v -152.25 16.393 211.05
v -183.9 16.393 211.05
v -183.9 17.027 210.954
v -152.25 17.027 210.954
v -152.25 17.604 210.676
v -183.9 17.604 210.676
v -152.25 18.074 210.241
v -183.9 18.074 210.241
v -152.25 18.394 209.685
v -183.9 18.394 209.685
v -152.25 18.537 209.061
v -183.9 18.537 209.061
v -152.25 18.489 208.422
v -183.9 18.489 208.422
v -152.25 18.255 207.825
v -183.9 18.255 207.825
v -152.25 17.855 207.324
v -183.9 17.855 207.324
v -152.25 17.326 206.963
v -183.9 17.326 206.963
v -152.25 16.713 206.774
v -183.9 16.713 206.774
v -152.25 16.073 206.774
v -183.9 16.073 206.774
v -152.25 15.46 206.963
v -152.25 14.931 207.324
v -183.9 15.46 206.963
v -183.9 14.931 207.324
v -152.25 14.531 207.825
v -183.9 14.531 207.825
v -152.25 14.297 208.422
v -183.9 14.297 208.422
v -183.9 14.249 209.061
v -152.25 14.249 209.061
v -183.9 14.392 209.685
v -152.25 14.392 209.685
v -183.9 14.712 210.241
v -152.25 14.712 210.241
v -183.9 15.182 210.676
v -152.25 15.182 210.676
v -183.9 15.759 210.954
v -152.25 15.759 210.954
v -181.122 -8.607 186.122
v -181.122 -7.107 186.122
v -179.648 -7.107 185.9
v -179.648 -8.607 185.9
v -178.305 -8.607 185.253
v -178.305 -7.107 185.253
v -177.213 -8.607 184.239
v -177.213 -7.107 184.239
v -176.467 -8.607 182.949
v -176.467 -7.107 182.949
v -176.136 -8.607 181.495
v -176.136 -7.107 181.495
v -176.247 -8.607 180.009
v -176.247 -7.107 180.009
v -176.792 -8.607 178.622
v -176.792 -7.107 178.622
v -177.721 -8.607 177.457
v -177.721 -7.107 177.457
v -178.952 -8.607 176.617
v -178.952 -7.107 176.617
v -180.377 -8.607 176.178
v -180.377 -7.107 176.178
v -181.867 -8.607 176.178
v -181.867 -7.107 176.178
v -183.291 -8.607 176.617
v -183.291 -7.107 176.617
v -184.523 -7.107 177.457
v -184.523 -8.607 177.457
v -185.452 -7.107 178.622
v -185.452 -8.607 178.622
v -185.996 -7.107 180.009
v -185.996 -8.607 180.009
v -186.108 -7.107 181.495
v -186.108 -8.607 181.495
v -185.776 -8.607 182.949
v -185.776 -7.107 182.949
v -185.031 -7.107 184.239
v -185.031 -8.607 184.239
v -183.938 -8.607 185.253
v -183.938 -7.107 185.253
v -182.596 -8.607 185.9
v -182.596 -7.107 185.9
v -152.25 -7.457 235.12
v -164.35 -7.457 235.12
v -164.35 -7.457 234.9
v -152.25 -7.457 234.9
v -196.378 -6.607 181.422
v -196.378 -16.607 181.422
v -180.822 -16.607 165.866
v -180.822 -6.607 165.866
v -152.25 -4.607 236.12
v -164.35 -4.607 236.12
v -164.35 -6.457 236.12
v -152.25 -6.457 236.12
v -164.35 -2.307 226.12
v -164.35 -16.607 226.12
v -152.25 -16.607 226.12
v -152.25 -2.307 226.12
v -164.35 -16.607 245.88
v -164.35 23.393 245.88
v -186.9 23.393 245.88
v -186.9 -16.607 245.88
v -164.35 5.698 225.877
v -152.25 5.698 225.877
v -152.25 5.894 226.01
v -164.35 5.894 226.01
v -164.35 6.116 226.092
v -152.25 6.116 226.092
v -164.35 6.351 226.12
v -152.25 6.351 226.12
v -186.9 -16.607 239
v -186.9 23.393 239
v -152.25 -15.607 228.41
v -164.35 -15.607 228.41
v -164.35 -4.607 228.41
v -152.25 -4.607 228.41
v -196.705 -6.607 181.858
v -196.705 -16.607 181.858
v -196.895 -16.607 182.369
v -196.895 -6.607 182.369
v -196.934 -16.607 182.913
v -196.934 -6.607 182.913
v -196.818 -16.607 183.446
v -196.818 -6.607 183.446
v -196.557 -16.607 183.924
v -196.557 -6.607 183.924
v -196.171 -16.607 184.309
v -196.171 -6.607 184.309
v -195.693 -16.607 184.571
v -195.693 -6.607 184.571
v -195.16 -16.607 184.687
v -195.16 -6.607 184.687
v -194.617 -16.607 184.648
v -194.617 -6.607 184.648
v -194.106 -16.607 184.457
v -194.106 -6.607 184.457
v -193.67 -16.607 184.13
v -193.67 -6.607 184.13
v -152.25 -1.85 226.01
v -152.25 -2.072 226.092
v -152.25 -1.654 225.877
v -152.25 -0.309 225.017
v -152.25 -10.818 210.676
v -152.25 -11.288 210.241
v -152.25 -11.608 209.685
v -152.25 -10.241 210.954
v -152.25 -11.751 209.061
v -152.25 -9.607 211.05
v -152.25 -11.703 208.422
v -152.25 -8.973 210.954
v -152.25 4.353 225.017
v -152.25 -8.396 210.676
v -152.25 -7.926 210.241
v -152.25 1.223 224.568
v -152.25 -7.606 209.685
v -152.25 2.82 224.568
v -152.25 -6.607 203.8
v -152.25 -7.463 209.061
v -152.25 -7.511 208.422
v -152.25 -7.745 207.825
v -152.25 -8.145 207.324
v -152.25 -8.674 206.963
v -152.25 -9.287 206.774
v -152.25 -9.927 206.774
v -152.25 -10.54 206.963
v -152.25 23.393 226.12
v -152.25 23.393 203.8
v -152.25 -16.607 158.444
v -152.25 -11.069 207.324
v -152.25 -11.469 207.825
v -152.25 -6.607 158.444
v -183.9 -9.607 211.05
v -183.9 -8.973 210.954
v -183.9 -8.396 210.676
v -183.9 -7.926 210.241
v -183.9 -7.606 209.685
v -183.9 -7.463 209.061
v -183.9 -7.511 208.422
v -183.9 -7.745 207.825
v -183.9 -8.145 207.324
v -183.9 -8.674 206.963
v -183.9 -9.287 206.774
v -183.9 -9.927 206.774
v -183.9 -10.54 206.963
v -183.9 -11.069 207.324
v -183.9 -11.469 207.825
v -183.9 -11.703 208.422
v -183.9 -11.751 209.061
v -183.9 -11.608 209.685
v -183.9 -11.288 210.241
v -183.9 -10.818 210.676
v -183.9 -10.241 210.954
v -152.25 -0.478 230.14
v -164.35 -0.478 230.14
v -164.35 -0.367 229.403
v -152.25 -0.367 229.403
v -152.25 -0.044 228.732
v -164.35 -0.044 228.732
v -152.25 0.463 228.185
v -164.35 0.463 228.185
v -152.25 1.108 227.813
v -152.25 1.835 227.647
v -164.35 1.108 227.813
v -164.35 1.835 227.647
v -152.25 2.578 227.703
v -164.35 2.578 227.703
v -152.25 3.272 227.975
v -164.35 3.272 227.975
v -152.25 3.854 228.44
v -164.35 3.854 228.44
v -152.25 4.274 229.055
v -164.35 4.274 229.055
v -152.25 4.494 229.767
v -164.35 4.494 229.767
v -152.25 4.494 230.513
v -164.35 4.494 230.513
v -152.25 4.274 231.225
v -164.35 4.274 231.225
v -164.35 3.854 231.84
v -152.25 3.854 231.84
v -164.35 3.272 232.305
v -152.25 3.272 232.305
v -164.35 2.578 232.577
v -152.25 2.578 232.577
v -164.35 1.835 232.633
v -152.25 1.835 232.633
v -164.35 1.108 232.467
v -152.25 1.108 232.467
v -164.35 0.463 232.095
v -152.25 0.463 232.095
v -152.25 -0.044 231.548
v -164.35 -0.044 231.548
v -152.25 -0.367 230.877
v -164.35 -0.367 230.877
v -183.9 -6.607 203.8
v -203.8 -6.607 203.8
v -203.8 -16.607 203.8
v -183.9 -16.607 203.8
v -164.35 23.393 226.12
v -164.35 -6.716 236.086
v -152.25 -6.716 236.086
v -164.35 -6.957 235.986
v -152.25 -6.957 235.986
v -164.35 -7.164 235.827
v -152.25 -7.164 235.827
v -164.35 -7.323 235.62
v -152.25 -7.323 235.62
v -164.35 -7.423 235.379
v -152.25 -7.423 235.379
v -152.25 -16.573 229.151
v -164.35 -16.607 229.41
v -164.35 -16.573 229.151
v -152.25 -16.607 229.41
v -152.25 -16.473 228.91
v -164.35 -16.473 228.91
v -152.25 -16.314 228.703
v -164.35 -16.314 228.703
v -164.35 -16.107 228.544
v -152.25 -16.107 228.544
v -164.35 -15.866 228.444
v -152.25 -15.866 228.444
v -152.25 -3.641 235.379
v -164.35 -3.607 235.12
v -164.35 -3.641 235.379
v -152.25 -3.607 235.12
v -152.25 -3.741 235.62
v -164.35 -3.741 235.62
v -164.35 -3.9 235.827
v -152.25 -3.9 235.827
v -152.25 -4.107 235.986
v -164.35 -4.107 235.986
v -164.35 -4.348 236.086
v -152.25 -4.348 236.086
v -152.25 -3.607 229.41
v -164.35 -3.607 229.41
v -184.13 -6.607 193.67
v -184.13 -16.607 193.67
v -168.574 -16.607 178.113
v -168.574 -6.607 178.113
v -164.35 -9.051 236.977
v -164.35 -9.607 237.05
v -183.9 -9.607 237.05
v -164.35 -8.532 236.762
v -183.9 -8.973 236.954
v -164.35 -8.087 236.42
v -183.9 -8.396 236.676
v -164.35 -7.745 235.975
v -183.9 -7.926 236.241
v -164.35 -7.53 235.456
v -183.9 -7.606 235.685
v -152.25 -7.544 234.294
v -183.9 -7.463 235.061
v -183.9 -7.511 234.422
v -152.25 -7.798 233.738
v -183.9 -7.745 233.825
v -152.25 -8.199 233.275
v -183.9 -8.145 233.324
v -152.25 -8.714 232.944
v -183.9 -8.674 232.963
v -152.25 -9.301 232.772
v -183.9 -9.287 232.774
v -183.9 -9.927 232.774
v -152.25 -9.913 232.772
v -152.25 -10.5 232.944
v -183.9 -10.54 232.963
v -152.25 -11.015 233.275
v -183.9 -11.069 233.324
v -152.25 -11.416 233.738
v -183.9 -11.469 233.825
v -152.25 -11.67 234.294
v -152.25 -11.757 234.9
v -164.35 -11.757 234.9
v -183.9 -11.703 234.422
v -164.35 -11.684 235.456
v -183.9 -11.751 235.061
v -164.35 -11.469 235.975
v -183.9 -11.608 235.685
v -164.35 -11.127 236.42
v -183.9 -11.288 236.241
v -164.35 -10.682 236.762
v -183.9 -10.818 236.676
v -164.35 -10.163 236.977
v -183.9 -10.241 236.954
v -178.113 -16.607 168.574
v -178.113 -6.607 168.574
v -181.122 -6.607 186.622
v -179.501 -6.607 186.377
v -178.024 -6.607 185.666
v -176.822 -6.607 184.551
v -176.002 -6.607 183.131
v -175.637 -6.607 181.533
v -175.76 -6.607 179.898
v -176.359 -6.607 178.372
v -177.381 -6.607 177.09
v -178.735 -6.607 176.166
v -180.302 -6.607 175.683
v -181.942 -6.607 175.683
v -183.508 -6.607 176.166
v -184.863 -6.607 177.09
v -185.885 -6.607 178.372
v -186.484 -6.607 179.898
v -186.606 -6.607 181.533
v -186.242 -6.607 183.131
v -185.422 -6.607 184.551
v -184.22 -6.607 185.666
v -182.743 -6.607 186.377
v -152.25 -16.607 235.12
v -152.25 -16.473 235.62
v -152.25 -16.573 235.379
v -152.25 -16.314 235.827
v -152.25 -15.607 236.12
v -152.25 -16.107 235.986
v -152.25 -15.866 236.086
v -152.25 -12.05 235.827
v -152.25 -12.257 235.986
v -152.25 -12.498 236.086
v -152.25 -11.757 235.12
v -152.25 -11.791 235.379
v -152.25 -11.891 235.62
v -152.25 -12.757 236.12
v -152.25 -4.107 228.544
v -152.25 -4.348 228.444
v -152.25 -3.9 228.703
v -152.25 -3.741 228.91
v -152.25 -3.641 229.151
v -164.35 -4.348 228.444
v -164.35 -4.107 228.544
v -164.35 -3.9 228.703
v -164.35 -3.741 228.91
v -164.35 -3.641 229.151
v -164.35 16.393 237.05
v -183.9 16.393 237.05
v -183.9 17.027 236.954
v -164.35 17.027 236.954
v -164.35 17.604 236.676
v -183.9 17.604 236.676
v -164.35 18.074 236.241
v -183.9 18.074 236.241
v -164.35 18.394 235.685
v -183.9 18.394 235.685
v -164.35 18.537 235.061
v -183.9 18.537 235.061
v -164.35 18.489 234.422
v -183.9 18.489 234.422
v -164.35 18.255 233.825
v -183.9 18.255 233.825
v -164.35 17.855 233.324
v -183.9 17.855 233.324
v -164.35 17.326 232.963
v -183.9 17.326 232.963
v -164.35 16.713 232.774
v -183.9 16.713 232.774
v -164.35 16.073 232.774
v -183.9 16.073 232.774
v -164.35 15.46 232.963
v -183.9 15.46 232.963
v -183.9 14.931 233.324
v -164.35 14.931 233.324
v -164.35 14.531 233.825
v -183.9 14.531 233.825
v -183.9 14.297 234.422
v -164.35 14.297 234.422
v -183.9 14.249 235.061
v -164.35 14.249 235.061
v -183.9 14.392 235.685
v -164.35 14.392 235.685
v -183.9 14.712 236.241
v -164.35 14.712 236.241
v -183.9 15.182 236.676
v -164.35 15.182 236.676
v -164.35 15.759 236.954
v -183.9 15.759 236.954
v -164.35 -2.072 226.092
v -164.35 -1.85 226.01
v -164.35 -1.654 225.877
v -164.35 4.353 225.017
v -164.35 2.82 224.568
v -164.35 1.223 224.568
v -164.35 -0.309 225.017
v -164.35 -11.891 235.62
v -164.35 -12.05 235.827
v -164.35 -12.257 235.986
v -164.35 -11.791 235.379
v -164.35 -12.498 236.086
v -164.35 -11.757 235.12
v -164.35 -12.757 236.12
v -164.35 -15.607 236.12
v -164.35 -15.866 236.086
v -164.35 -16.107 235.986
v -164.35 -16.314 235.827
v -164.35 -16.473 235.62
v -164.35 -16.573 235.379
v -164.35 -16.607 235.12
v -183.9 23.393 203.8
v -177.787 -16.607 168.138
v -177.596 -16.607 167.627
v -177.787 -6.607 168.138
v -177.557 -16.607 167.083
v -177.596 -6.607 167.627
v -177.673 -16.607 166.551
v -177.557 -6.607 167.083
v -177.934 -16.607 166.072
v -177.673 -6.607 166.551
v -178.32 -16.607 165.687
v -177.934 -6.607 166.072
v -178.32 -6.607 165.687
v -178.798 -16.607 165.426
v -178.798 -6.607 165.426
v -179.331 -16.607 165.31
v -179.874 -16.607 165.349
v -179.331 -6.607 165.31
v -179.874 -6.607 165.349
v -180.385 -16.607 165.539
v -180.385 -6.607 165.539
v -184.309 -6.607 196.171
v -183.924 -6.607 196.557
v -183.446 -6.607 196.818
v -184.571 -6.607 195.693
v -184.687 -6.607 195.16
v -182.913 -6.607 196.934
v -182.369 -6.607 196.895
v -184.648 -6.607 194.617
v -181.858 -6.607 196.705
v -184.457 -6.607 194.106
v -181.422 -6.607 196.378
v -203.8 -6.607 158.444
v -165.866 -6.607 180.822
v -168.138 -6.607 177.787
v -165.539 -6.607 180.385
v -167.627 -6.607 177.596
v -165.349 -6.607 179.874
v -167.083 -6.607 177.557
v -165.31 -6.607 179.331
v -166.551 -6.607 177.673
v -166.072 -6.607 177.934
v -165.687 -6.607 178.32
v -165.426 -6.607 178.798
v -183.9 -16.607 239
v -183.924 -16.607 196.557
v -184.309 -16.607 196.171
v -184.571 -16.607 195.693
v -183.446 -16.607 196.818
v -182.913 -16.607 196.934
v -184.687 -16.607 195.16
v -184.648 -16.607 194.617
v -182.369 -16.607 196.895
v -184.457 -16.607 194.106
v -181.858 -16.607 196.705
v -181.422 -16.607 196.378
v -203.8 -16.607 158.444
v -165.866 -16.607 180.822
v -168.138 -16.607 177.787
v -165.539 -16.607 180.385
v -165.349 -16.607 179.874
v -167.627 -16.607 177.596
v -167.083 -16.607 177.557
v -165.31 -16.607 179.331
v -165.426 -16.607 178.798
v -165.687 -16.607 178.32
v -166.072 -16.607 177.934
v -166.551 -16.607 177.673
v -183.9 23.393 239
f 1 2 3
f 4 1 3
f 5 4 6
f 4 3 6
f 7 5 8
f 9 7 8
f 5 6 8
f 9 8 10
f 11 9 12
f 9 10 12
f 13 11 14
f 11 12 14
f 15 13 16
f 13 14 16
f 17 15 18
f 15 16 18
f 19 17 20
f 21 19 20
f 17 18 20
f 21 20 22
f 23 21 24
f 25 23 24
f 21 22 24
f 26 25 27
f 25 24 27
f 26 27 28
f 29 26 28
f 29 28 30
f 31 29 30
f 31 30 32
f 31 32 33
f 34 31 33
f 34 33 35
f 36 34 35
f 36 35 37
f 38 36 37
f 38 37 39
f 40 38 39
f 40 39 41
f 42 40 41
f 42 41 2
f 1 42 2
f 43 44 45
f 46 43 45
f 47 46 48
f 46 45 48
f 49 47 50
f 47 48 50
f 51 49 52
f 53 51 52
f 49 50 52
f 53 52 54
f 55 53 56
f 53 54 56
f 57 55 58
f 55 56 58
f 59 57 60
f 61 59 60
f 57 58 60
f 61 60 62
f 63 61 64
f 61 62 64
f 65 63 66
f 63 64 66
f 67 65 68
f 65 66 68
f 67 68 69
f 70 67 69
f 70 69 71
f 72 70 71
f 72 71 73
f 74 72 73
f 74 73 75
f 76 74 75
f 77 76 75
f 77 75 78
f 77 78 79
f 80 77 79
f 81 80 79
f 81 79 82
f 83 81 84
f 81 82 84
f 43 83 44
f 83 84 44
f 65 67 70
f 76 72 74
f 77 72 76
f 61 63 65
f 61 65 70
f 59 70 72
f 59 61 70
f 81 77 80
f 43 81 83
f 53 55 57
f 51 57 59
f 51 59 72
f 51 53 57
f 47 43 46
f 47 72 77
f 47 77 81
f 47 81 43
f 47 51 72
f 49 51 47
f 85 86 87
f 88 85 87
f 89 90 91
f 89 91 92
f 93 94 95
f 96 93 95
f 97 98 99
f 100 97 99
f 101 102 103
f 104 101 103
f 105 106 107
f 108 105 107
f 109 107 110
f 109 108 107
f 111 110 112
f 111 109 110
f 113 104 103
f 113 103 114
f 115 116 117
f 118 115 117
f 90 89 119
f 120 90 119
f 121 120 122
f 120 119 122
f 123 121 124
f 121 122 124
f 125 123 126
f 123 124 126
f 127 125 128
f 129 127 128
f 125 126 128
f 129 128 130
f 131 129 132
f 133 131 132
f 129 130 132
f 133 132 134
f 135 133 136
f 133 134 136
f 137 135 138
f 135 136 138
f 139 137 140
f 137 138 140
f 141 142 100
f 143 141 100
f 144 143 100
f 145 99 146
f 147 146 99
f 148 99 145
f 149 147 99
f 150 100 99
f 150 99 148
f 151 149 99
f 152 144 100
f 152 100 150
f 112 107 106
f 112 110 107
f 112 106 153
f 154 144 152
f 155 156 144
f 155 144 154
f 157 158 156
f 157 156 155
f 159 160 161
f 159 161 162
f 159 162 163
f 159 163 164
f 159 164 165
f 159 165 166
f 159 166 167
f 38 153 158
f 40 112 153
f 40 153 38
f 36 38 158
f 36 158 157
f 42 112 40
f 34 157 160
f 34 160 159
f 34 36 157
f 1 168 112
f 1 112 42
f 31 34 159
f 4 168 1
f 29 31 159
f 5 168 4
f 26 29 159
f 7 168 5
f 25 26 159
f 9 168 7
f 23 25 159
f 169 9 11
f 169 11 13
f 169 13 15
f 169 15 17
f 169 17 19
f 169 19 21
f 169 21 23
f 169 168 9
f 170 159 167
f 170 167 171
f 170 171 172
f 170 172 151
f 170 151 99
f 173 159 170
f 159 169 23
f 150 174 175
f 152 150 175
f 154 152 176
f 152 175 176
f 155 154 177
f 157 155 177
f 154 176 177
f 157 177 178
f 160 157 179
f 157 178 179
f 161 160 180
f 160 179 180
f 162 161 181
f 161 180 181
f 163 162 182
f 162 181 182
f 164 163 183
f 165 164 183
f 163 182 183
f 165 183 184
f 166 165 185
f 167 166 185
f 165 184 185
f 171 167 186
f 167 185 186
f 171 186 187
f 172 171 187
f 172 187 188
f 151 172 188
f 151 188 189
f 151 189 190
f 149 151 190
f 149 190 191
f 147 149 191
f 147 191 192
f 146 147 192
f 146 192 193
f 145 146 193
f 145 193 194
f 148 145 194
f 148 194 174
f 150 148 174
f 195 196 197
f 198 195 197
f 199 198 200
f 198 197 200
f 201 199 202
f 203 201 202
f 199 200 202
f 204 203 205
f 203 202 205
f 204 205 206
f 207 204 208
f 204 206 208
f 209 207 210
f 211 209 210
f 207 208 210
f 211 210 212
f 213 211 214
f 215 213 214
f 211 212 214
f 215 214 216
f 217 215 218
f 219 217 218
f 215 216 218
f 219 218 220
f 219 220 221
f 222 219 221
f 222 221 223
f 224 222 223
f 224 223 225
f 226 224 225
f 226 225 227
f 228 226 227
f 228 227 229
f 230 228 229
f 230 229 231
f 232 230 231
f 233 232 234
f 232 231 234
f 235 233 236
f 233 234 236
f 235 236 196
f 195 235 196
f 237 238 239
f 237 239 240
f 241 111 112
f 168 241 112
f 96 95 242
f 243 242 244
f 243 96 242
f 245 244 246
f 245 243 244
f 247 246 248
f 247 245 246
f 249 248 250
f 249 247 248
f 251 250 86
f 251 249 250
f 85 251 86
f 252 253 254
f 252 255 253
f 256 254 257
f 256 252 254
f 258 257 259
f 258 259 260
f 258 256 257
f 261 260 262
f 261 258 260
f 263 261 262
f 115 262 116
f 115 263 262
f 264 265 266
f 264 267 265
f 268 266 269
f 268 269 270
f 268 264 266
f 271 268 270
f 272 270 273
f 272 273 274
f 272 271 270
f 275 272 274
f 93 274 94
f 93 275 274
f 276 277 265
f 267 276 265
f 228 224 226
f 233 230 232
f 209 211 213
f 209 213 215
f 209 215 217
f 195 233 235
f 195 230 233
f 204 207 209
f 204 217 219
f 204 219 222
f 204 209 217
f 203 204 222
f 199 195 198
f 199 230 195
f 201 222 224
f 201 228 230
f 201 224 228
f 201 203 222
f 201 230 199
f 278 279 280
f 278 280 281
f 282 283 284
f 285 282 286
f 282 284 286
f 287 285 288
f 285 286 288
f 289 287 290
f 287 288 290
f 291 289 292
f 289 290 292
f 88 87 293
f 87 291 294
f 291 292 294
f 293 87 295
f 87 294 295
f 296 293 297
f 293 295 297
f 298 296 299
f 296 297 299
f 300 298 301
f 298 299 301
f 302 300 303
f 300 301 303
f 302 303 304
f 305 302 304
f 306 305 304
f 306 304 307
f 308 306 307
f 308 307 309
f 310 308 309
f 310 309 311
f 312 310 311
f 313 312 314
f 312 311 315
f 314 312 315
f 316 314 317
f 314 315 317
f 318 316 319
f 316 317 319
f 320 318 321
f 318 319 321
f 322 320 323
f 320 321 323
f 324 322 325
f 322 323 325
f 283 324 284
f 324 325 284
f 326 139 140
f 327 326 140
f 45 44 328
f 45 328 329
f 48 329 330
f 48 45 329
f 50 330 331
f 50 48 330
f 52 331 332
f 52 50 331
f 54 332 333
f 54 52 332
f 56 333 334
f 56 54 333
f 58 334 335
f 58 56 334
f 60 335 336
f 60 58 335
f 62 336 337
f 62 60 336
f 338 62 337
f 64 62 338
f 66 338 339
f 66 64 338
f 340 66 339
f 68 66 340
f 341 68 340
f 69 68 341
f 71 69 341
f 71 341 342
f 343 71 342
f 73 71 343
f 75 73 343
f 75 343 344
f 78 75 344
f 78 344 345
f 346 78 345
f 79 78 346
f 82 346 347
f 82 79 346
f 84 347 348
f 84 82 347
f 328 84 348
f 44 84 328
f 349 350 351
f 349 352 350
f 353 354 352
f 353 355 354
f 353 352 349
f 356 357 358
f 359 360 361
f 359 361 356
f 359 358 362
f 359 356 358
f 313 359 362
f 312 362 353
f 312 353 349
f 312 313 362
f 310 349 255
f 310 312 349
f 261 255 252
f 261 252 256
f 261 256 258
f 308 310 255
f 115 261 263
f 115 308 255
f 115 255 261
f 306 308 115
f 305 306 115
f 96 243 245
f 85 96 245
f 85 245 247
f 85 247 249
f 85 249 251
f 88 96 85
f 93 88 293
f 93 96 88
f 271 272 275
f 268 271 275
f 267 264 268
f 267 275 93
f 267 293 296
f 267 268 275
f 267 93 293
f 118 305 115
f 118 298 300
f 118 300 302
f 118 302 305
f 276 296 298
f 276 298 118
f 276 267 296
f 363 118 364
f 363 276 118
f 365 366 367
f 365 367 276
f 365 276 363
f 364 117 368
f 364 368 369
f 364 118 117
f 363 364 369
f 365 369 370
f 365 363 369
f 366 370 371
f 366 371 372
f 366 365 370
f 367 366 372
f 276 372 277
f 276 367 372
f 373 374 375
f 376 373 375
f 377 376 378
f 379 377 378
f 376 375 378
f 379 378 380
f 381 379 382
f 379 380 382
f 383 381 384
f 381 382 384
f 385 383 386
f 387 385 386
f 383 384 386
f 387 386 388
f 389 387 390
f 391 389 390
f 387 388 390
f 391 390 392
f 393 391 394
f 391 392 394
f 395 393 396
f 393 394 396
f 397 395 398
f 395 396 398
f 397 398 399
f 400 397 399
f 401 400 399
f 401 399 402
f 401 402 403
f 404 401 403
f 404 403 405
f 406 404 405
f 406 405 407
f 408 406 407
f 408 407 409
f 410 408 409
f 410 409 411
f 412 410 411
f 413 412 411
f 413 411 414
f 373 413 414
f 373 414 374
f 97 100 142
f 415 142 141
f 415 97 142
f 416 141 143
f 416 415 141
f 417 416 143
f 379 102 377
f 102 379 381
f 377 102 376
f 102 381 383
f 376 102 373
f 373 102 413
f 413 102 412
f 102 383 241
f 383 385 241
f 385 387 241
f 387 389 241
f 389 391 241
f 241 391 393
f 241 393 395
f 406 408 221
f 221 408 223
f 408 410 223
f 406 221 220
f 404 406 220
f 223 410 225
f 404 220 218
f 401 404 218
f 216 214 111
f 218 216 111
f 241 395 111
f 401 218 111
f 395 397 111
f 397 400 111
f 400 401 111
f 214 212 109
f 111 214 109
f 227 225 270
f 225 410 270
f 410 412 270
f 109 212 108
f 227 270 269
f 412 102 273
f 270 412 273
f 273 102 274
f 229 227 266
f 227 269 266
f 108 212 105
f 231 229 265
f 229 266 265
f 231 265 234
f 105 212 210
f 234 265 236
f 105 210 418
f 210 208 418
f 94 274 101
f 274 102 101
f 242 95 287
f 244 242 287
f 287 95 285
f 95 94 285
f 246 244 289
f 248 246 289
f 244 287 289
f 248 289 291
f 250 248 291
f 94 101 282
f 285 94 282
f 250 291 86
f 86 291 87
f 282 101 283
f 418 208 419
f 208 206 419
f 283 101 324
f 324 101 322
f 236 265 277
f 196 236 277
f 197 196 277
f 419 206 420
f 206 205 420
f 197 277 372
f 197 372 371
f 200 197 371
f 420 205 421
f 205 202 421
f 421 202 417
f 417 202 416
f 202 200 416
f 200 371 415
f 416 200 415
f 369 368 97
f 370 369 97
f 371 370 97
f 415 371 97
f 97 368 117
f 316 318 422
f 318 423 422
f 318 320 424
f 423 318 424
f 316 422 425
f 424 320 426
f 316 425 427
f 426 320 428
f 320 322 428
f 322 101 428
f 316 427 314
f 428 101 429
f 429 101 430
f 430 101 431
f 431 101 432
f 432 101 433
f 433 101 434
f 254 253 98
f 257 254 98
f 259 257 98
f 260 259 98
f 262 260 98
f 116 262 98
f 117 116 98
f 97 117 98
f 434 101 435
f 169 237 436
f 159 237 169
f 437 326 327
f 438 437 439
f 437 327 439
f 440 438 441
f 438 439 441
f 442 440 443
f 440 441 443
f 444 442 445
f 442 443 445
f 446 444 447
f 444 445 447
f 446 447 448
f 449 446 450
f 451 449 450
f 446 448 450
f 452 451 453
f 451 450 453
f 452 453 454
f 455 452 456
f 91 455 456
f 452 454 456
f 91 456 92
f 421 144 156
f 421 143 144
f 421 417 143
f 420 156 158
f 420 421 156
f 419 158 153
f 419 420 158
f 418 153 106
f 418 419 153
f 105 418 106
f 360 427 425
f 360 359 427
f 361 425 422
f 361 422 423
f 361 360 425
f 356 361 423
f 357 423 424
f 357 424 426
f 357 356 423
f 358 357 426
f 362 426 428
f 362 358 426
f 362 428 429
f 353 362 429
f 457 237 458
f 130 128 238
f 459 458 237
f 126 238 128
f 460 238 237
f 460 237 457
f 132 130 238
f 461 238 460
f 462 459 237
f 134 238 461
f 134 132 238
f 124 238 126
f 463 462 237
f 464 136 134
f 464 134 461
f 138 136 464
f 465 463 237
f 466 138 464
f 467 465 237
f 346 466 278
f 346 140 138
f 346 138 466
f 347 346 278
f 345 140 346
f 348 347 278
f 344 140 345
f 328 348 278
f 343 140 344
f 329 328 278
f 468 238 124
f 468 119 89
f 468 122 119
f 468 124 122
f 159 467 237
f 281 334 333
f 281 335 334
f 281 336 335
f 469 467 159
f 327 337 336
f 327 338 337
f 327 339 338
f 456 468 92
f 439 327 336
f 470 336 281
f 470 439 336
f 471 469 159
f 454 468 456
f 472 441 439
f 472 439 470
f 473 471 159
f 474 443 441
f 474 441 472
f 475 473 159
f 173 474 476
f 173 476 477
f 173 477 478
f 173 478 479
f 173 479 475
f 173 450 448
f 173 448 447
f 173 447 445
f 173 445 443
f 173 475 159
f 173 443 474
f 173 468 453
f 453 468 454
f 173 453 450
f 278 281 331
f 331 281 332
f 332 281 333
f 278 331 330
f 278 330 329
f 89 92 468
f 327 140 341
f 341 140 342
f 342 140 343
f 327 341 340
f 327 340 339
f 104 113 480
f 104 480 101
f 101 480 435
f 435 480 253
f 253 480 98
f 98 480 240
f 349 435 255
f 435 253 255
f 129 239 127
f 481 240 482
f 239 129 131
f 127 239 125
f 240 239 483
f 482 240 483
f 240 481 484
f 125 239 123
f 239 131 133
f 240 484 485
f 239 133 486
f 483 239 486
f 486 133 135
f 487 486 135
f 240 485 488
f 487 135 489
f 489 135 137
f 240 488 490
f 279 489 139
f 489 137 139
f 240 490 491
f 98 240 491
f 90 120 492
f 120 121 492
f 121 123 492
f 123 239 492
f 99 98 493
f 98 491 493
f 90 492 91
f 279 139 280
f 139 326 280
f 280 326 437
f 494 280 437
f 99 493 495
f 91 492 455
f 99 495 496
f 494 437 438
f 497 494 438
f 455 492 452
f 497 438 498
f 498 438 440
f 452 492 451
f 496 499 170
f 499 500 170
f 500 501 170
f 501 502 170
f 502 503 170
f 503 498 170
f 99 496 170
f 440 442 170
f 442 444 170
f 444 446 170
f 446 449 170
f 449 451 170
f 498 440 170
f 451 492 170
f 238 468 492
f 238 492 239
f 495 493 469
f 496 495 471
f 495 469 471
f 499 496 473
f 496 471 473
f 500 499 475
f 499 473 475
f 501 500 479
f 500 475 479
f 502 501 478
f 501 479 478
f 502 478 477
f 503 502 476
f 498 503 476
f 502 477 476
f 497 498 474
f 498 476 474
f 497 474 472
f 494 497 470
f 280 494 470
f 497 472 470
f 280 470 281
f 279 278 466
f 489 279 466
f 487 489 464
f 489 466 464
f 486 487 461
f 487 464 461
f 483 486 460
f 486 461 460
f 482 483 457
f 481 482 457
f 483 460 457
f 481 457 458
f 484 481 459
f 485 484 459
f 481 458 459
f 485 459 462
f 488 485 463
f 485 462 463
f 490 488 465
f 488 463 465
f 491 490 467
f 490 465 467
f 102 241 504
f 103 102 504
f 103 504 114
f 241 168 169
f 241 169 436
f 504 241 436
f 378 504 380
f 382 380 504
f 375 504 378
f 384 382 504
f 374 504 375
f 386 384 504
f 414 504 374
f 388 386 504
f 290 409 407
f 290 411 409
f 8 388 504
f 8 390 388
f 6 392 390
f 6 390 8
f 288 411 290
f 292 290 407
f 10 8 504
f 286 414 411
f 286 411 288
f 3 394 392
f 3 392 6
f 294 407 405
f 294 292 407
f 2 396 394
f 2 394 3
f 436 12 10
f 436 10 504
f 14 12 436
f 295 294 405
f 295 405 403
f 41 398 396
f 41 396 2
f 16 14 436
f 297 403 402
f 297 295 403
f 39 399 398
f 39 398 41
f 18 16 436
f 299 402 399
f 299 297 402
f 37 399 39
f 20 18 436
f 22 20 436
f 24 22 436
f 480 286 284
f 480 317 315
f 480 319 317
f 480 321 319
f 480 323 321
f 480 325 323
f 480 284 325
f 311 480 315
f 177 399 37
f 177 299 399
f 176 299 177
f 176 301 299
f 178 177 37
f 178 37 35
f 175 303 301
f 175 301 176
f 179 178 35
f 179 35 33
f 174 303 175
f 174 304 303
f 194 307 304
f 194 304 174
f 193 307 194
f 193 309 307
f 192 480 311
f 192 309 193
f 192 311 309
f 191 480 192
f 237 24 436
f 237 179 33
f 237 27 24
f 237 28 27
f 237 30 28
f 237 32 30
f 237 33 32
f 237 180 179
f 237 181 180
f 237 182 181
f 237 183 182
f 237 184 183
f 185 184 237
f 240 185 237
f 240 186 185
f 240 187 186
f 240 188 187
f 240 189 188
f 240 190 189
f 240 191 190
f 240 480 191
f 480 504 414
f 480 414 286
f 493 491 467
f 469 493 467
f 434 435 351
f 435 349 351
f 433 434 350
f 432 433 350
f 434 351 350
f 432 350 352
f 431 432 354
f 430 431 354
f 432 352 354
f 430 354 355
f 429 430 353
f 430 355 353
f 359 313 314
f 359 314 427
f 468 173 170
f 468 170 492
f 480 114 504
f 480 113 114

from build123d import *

# Parameters (mm, degrees)
SKETCH3_W             = 13.49028586
SKETCH3_H             = 10
BOSS_EXTRUDE1_DEPTH   = 22
SKETCH3_W_2           = 3
BOSS_EXTRUDE1_2_DEPTH = 22
BOSS_EXTRUDE1_3_DEPTH = 22
SKETCH4_W             = 27.150730292
SKETCH4_H             = 10
BOSS_EXTRUDE2_DEPTH   = 3
SKETCH5_W             = 27.150730292
SKETCH5_H             = 10
BOSS_EXTRUDE3_DEPTH   = 3
SKETCH7_W             = 12.1
SKETCH7_H             = 14.76
BOSS_EXTRUDE4_DEPTH   = 10
BOSS_EXTRUDE5_DEPTH   = 10
SKETCH15_R            = 1.915111108
CUT_EXTRUDE4_DEPTH    = 320.517471197
SKETCH18_W            = 12.1
SKETCH18_H            = 14.76
BOSS_EXTRUDE6_DEPTH   = 30
M4_CLEARANCE_HOLE1_D  = 4.3
CUT_EXTRUDE7_DEPTH    = 5
SKETCH17_R            = 5
CUT_EXTRUDE6_DEPTH    = 2
CHAMFER1_SIZE         = 0.5
SKETCH24_W            = 5
SKETCH24_H            = 40
CUT_EXTRUDE8_DEPTH    = 12.1
SKETCH25_R            = 2.5
BOSS_EXTRUDE10_DEPTH  = 12.1
CUT_EXTRUDE10_START   = -12.1
SKETCH31_R            = 5.628705003
SKETCH31_R_2          = 2.5
CUT_EXTRUDE10_DEPTH   = 12.1
FILLET1_R             = 1


with BuildPart() as part:
    # Sketch3 → Boss-Extrude1 (new body)
    with BuildSketch(Plane(origin=(-188.9, 0, 188.9), x_dir=(0.7071067811865475, 0, 0.7071067811865477), z_dir=(-0.7071067811865477, 0, 0.7071067811865475))):
        with Locations((0, -11.606969024)):
            Rectangle(SKETCH3_W, SKETCH3_H)
    extrude(amount=-BOSS_EXTRUDE1_DEPTH)



with BuildPart() as body_2:
    # Sketch3 → Boss-Extrude1 2 (new body)
    with BuildSketch(Plane(origin=(-188.9, 0, 188.9), x_dir=(0.7071067811865475, 0, 0.7071067811865477), z_dir=(-0.7071067811865477, 0, 0.7071067811865475))):
        with Locations((12.075365146, -11.606969024)):
            Rectangle(SKETCH3_W_2, SKETCH3_H)
    extrude(amount=-BOSS_EXTRUDE1_2_DEPTH)


with BuildPart() as body_3:
    # Sketch3 → Boss-Extrude1 3 (new body)
    with BuildSketch(Plane(origin=(-188.9, 0, 188.9), x_dir=(0.7071067811865475, 0, 0.7071067811865477), z_dir=(-0.7071067811865477, 0, 0.7071067811865475))):
        with Locations((-12.075365146, -11.606969024)):
            Rectangle(SKETCH3_W_2, SKETCH3_H)
    extrude(amount=-BOSS_EXTRUDE1_3_DEPTH)


with BuildPart() as part_1:
    add(part.part)

    add(body_2.part)  # Boss-Extrude2 merges body 2

    add(body_3.part)  # Boss-Extrude2 merges body 3
    # Sketch4 → Boss-Extrude2 (add)
    with BuildSketch(Plane(origin=(-188.9, 0, 188.9), x_dir=(0.7071067811865472, 0, 0.7071067811865479), z_dir=(-0.7071067811865479, 0, 0.7071067811865472))):
        with Locations((0, -11.606969024)):
            Rectangle(SKETCH4_W, SKETCH4_H)
    extrude(amount=BOSS_EXTRUDE2_DEPTH)

    # Sketch5 → Boss-Extrude3 (add)
    with BuildSketch(Plane(origin=(-173.343650814, 0, 173.343650814), x_dir=(-0.7071067811865472, 0, -0.7071067811865479), z_dir=(0.7071067811865479, 0, -0.7071067811865472))):
        with Locations((0, -11.606969024)):
            Rectangle(SKETCH5_W, SKETCH5_H)
    extrude(amount=BOSS_EXTRUDE3_DEPTH)

    # Sketch7 → Boss-Extrude4 (add)
    with BuildSketch(Plane(origin=(0, -6.606969024, 0), x_dir=(1, 0, 0), z_dir=(0, 1, 0))):
        Polygon((-183.9, -239), (-186.9, -239), (-186.9, -245.88), (-147.25, -245.88), (-147.25, -161.623097719), (-180.821563222, -161.623097719), (-161.623097719, -180.821563222), (-181.422087592, -200.620553095), (-200.620553095, -181.422087592), (-200.620553095, -203.8), (-183.9, -203.8), align=None)
        with Locations((-158.3, -233.5)):
            Rectangle(SKETCH7_W, SKETCH7_H, mode=Mode.SUBTRACT)
    extrude(amount=-BOSS_EXTRUDE4_DEPTH)

    # Sketch13 → Boss-Extrude5 (add)
    with BuildSketch(Plane(origin=(0, -6.606969024, 0), x_dir=(1, 0, 0), z_dir=(0, 1, 0))):
        Polygon((-203.8, -203.8), (-200.620553095, -203.8), (-200.620553095, -181.422087592), (-180.821563222, -161.623097719), (-147.25, -161.623097719), (-147.25, -158.443650814), (-203.8, -158.443650814), align=None)
    extrude(amount=-BOSS_EXTRUDE5_DEPTH)

    # Sketch15 → Cut-Extrude4 (cut, through all)
    with BuildSketch(Plane(origin=(0, -6.606969024, 0), x_dir=(1, 0, 0), z_dir=(0, 1, 0))):
        with Locations((-179.467375171, -167.219926457)):
            Circle(SKETCH15_R)
        with Locations((-167.219926457, -179.467375171)):
            Circle(SKETCH15_R)
        with Locations((-195.023724357, -182.776275643)):
            Circle(SKETCH15_R)
        with Locations((-182.776275643, -195.023724357)):
            Circle(SKETCH15_R)
    extrude(amount=-CUT_EXTRUDE4_DEPTH, mode=Mode.SUBTRACT)

    # Sketch18 → Boss-Extrude6 (add)
    with BuildSketch(Plane(origin=(0, -6.606969024, 0), x_dir=(1, 0, 0), z_dir=(0, 1, 0))):
        Polygon((-183.9, -203.8), (-147.25, -203.8), (-147.25, -245.88), (-186.9, -245.88), (-186.9, -239), (-183.9, -239), align=None)
        with Locations((-158.3, -233.5)):
            Rectangle(SKETCH18_W, SKETCH18_H, mode=Mode.SUBTRACT)
    extrude(amount=BOSS_EXTRUDE6_DEPTH)

    # M4 Clearance Hole1 (through all)
    with Locations(Plane(origin=(-147.25, 0, 0), x_dir=(0, 0, -1), z_dir=(1, 0, 0))):
        with Locations((-234.9, 16.393030976), (-208.9, -9.606969024), (-234.9, -9.606969024), (-208.9, 16.393030976)):
            Hole(M4_CLEARANCE_HOLE1_D / 2)

    # Sketch22 → Cut-Extrude7 (cut)
    with BuildSketch(Plane(origin=(-147.25, 0, 0), x_dir=(0, 0, -1), z_dir=(1, 0, 0))):
        Polygon((-245.88, 23.393030976), (-245.88, -16.606969024), (-158.443650814, -16.606969024), (-158.443650814, -6.606969024), (-203.8, -6.606969024), (-203.8, 23.393030976), align=None)
    extrude(amount=-CUT_EXTRUDE7_DEPTH, mode=Mode.SUBTRACT)

    # Sketch17 → Cut-Extrude6 (cut)
    with BuildSketch(Plane(origin=(0, -6.606969024, 0), x_dir=(1, 0, 0), z_dir=(0, 1, 0))):
        with Locations(Location((-181.121825407, -181.121825407, 0), (0, 0, 270))):
            Circle(SKETCH17_R)
    extrude(amount=-CUT_EXTRUDE6_DEPTH, mode=Mode.SUBTRACT)

    # Chamfer1
    chamfer1_edges = [part_1.edges().sort_by_distance(p)[0] for p in [
        (-181.121825407, -6.606969024, 176.121825407),
    ]]
    chamfer(chamfer1_edges, length=CHAMFER1_SIZE)

    # Sketch24 → Cut-Extrude8 (cut)
    with BuildSketch(Plane(origin=(-152.25, 0, 0), x_dir=(0, 0, -1), z_dir=(1, 0, 0))):
        with Locations((-243.38, 3.393030976)):
            Rectangle(SKETCH24_W, SKETCH24_H)
    extrude(amount=-CUT_EXTRUDE8_DEPTH, mode=Mode.SUBTRACT)

    # Sketch25 → Boss-Extrude10 (add)
    with BuildSketch(Plane(origin=(-164.35, 0, 0), x_dir=(0, 0, -1), z_dir=(1, 0, 0))):
        with Locations(Location((-230.14, 2.021735979, 0), (0, 0, 270))):
            Circle(SKETCH25_R)
        with BuildLine():
            Line((-228.41, -3.606969024), (-236.12, -3.606969024))
            Line((-236.12, -3.606969024), (-236.12, -7.456969024))
            Line((-236.12, -7.456969024), (-234.9, -7.456969024))
            ThreePointArc((-234.9, -7.456969024), (-232.75, -9.606969024), (-234.9, -11.756969024))
            Line((-234.9, -11.756969024), (-236.12, -11.756969024))
            Line((-236.12, -11.756969024), (-236.12, -16.606969024))
            Line((-236.12, -16.606969024), (-228.41, -16.606969024))
            Line((-228.41, -16.606969024), (-228.41, -3.606969024))
        make_face()
    extrude(amount=BOSS_EXTRUDE10_DEPTH)

    # Sketch31 → Cut-Extrude10 (cut)
    with BuildSketch(Plane(origin=(-152.25, 0, 0), x_dir=(0, 0, -1), z_dir=(1, 0, 0)).offset(CUT_EXTRUDE10_START)):
        with Locations((-230.14, 2.021735979)):
            Circle(SKETCH31_R)
        with Locations(Location((-230.14, 2.021735979, 0), (0, 0, 270))):
            Circle(SKETCH31_R_2, mode=Mode.SUBTRACT)
    extrude(amount=CUT_EXTRUDE10_DEPTH, mode=Mode.SUBTRACT)

    # Fillet1
    fillet1_edges = [part_1.edges().sort_by_distance(p)[0] for p in [
        (-158.3, -16.606969024, 228.41),
        (-158.3, -3.606969024, 228.41),
        (-158.3, -3.606969024, 236.12),
        (-158.3, -7.456969024, 236.12),
        (-158.3, -11.756969024, 236.12),
        (-158.3, -16.606969024, 236.12),
        (-158.3, 5.961522777, 226.12),
        (-158.3, -1.918050819, 226.12),
    ]]
    fillet(fillet1_edges, radius=FILLET1_R)


solid = part_1.part
